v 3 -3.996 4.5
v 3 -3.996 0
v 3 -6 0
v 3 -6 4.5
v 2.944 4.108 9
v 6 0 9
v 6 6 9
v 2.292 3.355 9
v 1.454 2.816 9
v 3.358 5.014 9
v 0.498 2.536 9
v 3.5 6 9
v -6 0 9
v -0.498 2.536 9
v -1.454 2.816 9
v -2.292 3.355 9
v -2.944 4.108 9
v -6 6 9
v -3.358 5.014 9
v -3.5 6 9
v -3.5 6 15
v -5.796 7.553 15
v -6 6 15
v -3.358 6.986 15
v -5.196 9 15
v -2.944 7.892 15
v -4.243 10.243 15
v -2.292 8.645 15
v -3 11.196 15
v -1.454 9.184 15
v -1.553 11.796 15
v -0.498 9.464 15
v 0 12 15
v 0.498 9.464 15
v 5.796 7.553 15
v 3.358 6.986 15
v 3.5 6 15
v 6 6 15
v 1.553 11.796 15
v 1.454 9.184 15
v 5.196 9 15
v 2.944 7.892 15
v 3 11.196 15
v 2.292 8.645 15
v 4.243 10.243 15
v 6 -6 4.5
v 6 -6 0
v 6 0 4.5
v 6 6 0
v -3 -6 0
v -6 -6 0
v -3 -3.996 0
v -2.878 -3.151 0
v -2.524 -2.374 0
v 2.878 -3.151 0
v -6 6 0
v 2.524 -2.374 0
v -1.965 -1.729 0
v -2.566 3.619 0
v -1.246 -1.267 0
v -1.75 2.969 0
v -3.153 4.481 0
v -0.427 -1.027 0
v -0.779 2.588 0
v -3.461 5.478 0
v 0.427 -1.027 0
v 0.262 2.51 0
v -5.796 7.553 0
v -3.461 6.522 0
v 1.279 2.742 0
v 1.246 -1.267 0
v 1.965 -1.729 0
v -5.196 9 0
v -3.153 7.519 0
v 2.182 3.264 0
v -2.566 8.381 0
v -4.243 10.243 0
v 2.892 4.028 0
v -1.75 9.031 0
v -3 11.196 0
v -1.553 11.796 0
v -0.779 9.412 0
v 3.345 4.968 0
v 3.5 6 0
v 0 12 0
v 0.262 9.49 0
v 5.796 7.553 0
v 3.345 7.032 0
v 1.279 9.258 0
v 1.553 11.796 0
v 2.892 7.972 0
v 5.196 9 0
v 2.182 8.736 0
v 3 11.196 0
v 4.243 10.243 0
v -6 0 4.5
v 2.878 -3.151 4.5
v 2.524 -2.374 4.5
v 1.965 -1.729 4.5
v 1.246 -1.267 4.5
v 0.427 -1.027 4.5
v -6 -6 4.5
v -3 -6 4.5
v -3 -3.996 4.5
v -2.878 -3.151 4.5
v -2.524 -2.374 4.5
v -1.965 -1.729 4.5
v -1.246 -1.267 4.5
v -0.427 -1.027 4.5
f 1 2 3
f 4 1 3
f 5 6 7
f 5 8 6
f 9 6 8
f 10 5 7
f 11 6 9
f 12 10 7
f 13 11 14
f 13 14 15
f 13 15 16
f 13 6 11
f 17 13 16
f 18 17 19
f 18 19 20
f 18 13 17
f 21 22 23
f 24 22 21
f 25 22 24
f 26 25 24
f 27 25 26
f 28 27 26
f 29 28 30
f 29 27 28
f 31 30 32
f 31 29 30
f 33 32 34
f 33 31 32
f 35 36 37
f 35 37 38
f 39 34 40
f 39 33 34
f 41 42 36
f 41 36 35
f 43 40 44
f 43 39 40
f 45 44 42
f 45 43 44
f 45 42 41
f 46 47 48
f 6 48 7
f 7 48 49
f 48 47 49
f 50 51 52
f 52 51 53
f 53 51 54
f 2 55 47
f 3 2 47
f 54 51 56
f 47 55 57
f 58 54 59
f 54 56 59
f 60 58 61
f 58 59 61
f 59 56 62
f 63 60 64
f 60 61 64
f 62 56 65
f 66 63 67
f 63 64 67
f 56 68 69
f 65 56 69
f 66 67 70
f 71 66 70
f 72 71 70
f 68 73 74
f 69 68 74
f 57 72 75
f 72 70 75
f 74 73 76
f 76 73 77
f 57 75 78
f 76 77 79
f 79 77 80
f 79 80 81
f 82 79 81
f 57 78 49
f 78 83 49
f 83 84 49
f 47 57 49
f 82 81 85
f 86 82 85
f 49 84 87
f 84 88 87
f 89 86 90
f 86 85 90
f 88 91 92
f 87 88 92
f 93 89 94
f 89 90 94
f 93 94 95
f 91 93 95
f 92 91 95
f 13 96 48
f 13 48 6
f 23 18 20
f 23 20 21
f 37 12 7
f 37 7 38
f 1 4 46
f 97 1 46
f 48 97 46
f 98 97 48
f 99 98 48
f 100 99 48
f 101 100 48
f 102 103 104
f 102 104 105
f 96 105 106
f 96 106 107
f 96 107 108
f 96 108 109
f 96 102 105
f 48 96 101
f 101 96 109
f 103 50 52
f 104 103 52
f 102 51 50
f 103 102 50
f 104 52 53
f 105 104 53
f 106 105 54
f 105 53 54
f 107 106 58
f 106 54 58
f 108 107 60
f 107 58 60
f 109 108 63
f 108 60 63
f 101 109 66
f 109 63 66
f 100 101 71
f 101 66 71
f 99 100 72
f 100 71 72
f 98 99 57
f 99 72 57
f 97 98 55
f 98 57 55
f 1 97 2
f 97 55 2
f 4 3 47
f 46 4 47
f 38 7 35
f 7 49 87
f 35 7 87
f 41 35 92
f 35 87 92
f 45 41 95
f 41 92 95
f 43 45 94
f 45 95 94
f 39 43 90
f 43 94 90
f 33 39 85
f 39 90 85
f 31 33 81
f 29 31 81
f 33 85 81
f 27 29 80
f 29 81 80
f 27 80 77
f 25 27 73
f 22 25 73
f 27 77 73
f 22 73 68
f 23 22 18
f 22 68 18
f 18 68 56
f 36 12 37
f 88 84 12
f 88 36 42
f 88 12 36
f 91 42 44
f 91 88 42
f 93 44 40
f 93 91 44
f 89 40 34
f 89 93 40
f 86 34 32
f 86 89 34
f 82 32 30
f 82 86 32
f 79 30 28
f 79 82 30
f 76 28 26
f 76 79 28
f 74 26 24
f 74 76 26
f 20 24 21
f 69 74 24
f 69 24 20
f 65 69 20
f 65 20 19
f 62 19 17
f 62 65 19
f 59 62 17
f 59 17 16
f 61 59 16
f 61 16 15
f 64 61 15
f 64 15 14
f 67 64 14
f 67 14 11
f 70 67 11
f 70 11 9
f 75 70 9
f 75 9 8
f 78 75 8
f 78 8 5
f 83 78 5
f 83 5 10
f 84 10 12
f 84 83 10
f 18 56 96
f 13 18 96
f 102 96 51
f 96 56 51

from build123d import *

# Parameters (mm, degrees)
SKETCH1_R           = 3.5
BOSS_EXTRUDE1_DEPTH = 15
CUT_EXTRUDE1_DEPTH  = 15


with BuildPart() as part:
    # Sketch1 → Boss-Extrude1 (new body)
    with BuildSketch(Plane.XY):
        with BuildLine():
            Line((-6, 6), (-6, -6))
            Line((-6, -6), (-3, -6))
            Line((-3, -6), (-3, -3.996197441))
            ThreePointArc((-3, -3.996197441), (0, -0.996197441), (3, -3.996197441))
            Line((3, -3.996197441), (3, -6))
            Line((3, -6), (6, -6))
            Line((6, -6), (6, 6))
            ThreePointArc((6, 6), (0, 12), (-6, 6))
        make_face()
        with Locations((0, 6)):
            Circle(SKETCH1_R, mode=Mode.SUBTRACT)
    extrude(amount=BOSS_EXTRUDE1_DEPTH)

    # Sketch2 → Cut-Extrude1 (cut)
    with BuildSketch(Plane.ZY.offset(6)):
        Polygon((4.5, -6), (4.5, 0), (9, 0), (9, 6), (15, 6), (15, -6), align=None)
    extrude(amount=-CUT_EXTRUDE1_DEPTH, mode=Mode.SUBTRACT)


solid = part.part
